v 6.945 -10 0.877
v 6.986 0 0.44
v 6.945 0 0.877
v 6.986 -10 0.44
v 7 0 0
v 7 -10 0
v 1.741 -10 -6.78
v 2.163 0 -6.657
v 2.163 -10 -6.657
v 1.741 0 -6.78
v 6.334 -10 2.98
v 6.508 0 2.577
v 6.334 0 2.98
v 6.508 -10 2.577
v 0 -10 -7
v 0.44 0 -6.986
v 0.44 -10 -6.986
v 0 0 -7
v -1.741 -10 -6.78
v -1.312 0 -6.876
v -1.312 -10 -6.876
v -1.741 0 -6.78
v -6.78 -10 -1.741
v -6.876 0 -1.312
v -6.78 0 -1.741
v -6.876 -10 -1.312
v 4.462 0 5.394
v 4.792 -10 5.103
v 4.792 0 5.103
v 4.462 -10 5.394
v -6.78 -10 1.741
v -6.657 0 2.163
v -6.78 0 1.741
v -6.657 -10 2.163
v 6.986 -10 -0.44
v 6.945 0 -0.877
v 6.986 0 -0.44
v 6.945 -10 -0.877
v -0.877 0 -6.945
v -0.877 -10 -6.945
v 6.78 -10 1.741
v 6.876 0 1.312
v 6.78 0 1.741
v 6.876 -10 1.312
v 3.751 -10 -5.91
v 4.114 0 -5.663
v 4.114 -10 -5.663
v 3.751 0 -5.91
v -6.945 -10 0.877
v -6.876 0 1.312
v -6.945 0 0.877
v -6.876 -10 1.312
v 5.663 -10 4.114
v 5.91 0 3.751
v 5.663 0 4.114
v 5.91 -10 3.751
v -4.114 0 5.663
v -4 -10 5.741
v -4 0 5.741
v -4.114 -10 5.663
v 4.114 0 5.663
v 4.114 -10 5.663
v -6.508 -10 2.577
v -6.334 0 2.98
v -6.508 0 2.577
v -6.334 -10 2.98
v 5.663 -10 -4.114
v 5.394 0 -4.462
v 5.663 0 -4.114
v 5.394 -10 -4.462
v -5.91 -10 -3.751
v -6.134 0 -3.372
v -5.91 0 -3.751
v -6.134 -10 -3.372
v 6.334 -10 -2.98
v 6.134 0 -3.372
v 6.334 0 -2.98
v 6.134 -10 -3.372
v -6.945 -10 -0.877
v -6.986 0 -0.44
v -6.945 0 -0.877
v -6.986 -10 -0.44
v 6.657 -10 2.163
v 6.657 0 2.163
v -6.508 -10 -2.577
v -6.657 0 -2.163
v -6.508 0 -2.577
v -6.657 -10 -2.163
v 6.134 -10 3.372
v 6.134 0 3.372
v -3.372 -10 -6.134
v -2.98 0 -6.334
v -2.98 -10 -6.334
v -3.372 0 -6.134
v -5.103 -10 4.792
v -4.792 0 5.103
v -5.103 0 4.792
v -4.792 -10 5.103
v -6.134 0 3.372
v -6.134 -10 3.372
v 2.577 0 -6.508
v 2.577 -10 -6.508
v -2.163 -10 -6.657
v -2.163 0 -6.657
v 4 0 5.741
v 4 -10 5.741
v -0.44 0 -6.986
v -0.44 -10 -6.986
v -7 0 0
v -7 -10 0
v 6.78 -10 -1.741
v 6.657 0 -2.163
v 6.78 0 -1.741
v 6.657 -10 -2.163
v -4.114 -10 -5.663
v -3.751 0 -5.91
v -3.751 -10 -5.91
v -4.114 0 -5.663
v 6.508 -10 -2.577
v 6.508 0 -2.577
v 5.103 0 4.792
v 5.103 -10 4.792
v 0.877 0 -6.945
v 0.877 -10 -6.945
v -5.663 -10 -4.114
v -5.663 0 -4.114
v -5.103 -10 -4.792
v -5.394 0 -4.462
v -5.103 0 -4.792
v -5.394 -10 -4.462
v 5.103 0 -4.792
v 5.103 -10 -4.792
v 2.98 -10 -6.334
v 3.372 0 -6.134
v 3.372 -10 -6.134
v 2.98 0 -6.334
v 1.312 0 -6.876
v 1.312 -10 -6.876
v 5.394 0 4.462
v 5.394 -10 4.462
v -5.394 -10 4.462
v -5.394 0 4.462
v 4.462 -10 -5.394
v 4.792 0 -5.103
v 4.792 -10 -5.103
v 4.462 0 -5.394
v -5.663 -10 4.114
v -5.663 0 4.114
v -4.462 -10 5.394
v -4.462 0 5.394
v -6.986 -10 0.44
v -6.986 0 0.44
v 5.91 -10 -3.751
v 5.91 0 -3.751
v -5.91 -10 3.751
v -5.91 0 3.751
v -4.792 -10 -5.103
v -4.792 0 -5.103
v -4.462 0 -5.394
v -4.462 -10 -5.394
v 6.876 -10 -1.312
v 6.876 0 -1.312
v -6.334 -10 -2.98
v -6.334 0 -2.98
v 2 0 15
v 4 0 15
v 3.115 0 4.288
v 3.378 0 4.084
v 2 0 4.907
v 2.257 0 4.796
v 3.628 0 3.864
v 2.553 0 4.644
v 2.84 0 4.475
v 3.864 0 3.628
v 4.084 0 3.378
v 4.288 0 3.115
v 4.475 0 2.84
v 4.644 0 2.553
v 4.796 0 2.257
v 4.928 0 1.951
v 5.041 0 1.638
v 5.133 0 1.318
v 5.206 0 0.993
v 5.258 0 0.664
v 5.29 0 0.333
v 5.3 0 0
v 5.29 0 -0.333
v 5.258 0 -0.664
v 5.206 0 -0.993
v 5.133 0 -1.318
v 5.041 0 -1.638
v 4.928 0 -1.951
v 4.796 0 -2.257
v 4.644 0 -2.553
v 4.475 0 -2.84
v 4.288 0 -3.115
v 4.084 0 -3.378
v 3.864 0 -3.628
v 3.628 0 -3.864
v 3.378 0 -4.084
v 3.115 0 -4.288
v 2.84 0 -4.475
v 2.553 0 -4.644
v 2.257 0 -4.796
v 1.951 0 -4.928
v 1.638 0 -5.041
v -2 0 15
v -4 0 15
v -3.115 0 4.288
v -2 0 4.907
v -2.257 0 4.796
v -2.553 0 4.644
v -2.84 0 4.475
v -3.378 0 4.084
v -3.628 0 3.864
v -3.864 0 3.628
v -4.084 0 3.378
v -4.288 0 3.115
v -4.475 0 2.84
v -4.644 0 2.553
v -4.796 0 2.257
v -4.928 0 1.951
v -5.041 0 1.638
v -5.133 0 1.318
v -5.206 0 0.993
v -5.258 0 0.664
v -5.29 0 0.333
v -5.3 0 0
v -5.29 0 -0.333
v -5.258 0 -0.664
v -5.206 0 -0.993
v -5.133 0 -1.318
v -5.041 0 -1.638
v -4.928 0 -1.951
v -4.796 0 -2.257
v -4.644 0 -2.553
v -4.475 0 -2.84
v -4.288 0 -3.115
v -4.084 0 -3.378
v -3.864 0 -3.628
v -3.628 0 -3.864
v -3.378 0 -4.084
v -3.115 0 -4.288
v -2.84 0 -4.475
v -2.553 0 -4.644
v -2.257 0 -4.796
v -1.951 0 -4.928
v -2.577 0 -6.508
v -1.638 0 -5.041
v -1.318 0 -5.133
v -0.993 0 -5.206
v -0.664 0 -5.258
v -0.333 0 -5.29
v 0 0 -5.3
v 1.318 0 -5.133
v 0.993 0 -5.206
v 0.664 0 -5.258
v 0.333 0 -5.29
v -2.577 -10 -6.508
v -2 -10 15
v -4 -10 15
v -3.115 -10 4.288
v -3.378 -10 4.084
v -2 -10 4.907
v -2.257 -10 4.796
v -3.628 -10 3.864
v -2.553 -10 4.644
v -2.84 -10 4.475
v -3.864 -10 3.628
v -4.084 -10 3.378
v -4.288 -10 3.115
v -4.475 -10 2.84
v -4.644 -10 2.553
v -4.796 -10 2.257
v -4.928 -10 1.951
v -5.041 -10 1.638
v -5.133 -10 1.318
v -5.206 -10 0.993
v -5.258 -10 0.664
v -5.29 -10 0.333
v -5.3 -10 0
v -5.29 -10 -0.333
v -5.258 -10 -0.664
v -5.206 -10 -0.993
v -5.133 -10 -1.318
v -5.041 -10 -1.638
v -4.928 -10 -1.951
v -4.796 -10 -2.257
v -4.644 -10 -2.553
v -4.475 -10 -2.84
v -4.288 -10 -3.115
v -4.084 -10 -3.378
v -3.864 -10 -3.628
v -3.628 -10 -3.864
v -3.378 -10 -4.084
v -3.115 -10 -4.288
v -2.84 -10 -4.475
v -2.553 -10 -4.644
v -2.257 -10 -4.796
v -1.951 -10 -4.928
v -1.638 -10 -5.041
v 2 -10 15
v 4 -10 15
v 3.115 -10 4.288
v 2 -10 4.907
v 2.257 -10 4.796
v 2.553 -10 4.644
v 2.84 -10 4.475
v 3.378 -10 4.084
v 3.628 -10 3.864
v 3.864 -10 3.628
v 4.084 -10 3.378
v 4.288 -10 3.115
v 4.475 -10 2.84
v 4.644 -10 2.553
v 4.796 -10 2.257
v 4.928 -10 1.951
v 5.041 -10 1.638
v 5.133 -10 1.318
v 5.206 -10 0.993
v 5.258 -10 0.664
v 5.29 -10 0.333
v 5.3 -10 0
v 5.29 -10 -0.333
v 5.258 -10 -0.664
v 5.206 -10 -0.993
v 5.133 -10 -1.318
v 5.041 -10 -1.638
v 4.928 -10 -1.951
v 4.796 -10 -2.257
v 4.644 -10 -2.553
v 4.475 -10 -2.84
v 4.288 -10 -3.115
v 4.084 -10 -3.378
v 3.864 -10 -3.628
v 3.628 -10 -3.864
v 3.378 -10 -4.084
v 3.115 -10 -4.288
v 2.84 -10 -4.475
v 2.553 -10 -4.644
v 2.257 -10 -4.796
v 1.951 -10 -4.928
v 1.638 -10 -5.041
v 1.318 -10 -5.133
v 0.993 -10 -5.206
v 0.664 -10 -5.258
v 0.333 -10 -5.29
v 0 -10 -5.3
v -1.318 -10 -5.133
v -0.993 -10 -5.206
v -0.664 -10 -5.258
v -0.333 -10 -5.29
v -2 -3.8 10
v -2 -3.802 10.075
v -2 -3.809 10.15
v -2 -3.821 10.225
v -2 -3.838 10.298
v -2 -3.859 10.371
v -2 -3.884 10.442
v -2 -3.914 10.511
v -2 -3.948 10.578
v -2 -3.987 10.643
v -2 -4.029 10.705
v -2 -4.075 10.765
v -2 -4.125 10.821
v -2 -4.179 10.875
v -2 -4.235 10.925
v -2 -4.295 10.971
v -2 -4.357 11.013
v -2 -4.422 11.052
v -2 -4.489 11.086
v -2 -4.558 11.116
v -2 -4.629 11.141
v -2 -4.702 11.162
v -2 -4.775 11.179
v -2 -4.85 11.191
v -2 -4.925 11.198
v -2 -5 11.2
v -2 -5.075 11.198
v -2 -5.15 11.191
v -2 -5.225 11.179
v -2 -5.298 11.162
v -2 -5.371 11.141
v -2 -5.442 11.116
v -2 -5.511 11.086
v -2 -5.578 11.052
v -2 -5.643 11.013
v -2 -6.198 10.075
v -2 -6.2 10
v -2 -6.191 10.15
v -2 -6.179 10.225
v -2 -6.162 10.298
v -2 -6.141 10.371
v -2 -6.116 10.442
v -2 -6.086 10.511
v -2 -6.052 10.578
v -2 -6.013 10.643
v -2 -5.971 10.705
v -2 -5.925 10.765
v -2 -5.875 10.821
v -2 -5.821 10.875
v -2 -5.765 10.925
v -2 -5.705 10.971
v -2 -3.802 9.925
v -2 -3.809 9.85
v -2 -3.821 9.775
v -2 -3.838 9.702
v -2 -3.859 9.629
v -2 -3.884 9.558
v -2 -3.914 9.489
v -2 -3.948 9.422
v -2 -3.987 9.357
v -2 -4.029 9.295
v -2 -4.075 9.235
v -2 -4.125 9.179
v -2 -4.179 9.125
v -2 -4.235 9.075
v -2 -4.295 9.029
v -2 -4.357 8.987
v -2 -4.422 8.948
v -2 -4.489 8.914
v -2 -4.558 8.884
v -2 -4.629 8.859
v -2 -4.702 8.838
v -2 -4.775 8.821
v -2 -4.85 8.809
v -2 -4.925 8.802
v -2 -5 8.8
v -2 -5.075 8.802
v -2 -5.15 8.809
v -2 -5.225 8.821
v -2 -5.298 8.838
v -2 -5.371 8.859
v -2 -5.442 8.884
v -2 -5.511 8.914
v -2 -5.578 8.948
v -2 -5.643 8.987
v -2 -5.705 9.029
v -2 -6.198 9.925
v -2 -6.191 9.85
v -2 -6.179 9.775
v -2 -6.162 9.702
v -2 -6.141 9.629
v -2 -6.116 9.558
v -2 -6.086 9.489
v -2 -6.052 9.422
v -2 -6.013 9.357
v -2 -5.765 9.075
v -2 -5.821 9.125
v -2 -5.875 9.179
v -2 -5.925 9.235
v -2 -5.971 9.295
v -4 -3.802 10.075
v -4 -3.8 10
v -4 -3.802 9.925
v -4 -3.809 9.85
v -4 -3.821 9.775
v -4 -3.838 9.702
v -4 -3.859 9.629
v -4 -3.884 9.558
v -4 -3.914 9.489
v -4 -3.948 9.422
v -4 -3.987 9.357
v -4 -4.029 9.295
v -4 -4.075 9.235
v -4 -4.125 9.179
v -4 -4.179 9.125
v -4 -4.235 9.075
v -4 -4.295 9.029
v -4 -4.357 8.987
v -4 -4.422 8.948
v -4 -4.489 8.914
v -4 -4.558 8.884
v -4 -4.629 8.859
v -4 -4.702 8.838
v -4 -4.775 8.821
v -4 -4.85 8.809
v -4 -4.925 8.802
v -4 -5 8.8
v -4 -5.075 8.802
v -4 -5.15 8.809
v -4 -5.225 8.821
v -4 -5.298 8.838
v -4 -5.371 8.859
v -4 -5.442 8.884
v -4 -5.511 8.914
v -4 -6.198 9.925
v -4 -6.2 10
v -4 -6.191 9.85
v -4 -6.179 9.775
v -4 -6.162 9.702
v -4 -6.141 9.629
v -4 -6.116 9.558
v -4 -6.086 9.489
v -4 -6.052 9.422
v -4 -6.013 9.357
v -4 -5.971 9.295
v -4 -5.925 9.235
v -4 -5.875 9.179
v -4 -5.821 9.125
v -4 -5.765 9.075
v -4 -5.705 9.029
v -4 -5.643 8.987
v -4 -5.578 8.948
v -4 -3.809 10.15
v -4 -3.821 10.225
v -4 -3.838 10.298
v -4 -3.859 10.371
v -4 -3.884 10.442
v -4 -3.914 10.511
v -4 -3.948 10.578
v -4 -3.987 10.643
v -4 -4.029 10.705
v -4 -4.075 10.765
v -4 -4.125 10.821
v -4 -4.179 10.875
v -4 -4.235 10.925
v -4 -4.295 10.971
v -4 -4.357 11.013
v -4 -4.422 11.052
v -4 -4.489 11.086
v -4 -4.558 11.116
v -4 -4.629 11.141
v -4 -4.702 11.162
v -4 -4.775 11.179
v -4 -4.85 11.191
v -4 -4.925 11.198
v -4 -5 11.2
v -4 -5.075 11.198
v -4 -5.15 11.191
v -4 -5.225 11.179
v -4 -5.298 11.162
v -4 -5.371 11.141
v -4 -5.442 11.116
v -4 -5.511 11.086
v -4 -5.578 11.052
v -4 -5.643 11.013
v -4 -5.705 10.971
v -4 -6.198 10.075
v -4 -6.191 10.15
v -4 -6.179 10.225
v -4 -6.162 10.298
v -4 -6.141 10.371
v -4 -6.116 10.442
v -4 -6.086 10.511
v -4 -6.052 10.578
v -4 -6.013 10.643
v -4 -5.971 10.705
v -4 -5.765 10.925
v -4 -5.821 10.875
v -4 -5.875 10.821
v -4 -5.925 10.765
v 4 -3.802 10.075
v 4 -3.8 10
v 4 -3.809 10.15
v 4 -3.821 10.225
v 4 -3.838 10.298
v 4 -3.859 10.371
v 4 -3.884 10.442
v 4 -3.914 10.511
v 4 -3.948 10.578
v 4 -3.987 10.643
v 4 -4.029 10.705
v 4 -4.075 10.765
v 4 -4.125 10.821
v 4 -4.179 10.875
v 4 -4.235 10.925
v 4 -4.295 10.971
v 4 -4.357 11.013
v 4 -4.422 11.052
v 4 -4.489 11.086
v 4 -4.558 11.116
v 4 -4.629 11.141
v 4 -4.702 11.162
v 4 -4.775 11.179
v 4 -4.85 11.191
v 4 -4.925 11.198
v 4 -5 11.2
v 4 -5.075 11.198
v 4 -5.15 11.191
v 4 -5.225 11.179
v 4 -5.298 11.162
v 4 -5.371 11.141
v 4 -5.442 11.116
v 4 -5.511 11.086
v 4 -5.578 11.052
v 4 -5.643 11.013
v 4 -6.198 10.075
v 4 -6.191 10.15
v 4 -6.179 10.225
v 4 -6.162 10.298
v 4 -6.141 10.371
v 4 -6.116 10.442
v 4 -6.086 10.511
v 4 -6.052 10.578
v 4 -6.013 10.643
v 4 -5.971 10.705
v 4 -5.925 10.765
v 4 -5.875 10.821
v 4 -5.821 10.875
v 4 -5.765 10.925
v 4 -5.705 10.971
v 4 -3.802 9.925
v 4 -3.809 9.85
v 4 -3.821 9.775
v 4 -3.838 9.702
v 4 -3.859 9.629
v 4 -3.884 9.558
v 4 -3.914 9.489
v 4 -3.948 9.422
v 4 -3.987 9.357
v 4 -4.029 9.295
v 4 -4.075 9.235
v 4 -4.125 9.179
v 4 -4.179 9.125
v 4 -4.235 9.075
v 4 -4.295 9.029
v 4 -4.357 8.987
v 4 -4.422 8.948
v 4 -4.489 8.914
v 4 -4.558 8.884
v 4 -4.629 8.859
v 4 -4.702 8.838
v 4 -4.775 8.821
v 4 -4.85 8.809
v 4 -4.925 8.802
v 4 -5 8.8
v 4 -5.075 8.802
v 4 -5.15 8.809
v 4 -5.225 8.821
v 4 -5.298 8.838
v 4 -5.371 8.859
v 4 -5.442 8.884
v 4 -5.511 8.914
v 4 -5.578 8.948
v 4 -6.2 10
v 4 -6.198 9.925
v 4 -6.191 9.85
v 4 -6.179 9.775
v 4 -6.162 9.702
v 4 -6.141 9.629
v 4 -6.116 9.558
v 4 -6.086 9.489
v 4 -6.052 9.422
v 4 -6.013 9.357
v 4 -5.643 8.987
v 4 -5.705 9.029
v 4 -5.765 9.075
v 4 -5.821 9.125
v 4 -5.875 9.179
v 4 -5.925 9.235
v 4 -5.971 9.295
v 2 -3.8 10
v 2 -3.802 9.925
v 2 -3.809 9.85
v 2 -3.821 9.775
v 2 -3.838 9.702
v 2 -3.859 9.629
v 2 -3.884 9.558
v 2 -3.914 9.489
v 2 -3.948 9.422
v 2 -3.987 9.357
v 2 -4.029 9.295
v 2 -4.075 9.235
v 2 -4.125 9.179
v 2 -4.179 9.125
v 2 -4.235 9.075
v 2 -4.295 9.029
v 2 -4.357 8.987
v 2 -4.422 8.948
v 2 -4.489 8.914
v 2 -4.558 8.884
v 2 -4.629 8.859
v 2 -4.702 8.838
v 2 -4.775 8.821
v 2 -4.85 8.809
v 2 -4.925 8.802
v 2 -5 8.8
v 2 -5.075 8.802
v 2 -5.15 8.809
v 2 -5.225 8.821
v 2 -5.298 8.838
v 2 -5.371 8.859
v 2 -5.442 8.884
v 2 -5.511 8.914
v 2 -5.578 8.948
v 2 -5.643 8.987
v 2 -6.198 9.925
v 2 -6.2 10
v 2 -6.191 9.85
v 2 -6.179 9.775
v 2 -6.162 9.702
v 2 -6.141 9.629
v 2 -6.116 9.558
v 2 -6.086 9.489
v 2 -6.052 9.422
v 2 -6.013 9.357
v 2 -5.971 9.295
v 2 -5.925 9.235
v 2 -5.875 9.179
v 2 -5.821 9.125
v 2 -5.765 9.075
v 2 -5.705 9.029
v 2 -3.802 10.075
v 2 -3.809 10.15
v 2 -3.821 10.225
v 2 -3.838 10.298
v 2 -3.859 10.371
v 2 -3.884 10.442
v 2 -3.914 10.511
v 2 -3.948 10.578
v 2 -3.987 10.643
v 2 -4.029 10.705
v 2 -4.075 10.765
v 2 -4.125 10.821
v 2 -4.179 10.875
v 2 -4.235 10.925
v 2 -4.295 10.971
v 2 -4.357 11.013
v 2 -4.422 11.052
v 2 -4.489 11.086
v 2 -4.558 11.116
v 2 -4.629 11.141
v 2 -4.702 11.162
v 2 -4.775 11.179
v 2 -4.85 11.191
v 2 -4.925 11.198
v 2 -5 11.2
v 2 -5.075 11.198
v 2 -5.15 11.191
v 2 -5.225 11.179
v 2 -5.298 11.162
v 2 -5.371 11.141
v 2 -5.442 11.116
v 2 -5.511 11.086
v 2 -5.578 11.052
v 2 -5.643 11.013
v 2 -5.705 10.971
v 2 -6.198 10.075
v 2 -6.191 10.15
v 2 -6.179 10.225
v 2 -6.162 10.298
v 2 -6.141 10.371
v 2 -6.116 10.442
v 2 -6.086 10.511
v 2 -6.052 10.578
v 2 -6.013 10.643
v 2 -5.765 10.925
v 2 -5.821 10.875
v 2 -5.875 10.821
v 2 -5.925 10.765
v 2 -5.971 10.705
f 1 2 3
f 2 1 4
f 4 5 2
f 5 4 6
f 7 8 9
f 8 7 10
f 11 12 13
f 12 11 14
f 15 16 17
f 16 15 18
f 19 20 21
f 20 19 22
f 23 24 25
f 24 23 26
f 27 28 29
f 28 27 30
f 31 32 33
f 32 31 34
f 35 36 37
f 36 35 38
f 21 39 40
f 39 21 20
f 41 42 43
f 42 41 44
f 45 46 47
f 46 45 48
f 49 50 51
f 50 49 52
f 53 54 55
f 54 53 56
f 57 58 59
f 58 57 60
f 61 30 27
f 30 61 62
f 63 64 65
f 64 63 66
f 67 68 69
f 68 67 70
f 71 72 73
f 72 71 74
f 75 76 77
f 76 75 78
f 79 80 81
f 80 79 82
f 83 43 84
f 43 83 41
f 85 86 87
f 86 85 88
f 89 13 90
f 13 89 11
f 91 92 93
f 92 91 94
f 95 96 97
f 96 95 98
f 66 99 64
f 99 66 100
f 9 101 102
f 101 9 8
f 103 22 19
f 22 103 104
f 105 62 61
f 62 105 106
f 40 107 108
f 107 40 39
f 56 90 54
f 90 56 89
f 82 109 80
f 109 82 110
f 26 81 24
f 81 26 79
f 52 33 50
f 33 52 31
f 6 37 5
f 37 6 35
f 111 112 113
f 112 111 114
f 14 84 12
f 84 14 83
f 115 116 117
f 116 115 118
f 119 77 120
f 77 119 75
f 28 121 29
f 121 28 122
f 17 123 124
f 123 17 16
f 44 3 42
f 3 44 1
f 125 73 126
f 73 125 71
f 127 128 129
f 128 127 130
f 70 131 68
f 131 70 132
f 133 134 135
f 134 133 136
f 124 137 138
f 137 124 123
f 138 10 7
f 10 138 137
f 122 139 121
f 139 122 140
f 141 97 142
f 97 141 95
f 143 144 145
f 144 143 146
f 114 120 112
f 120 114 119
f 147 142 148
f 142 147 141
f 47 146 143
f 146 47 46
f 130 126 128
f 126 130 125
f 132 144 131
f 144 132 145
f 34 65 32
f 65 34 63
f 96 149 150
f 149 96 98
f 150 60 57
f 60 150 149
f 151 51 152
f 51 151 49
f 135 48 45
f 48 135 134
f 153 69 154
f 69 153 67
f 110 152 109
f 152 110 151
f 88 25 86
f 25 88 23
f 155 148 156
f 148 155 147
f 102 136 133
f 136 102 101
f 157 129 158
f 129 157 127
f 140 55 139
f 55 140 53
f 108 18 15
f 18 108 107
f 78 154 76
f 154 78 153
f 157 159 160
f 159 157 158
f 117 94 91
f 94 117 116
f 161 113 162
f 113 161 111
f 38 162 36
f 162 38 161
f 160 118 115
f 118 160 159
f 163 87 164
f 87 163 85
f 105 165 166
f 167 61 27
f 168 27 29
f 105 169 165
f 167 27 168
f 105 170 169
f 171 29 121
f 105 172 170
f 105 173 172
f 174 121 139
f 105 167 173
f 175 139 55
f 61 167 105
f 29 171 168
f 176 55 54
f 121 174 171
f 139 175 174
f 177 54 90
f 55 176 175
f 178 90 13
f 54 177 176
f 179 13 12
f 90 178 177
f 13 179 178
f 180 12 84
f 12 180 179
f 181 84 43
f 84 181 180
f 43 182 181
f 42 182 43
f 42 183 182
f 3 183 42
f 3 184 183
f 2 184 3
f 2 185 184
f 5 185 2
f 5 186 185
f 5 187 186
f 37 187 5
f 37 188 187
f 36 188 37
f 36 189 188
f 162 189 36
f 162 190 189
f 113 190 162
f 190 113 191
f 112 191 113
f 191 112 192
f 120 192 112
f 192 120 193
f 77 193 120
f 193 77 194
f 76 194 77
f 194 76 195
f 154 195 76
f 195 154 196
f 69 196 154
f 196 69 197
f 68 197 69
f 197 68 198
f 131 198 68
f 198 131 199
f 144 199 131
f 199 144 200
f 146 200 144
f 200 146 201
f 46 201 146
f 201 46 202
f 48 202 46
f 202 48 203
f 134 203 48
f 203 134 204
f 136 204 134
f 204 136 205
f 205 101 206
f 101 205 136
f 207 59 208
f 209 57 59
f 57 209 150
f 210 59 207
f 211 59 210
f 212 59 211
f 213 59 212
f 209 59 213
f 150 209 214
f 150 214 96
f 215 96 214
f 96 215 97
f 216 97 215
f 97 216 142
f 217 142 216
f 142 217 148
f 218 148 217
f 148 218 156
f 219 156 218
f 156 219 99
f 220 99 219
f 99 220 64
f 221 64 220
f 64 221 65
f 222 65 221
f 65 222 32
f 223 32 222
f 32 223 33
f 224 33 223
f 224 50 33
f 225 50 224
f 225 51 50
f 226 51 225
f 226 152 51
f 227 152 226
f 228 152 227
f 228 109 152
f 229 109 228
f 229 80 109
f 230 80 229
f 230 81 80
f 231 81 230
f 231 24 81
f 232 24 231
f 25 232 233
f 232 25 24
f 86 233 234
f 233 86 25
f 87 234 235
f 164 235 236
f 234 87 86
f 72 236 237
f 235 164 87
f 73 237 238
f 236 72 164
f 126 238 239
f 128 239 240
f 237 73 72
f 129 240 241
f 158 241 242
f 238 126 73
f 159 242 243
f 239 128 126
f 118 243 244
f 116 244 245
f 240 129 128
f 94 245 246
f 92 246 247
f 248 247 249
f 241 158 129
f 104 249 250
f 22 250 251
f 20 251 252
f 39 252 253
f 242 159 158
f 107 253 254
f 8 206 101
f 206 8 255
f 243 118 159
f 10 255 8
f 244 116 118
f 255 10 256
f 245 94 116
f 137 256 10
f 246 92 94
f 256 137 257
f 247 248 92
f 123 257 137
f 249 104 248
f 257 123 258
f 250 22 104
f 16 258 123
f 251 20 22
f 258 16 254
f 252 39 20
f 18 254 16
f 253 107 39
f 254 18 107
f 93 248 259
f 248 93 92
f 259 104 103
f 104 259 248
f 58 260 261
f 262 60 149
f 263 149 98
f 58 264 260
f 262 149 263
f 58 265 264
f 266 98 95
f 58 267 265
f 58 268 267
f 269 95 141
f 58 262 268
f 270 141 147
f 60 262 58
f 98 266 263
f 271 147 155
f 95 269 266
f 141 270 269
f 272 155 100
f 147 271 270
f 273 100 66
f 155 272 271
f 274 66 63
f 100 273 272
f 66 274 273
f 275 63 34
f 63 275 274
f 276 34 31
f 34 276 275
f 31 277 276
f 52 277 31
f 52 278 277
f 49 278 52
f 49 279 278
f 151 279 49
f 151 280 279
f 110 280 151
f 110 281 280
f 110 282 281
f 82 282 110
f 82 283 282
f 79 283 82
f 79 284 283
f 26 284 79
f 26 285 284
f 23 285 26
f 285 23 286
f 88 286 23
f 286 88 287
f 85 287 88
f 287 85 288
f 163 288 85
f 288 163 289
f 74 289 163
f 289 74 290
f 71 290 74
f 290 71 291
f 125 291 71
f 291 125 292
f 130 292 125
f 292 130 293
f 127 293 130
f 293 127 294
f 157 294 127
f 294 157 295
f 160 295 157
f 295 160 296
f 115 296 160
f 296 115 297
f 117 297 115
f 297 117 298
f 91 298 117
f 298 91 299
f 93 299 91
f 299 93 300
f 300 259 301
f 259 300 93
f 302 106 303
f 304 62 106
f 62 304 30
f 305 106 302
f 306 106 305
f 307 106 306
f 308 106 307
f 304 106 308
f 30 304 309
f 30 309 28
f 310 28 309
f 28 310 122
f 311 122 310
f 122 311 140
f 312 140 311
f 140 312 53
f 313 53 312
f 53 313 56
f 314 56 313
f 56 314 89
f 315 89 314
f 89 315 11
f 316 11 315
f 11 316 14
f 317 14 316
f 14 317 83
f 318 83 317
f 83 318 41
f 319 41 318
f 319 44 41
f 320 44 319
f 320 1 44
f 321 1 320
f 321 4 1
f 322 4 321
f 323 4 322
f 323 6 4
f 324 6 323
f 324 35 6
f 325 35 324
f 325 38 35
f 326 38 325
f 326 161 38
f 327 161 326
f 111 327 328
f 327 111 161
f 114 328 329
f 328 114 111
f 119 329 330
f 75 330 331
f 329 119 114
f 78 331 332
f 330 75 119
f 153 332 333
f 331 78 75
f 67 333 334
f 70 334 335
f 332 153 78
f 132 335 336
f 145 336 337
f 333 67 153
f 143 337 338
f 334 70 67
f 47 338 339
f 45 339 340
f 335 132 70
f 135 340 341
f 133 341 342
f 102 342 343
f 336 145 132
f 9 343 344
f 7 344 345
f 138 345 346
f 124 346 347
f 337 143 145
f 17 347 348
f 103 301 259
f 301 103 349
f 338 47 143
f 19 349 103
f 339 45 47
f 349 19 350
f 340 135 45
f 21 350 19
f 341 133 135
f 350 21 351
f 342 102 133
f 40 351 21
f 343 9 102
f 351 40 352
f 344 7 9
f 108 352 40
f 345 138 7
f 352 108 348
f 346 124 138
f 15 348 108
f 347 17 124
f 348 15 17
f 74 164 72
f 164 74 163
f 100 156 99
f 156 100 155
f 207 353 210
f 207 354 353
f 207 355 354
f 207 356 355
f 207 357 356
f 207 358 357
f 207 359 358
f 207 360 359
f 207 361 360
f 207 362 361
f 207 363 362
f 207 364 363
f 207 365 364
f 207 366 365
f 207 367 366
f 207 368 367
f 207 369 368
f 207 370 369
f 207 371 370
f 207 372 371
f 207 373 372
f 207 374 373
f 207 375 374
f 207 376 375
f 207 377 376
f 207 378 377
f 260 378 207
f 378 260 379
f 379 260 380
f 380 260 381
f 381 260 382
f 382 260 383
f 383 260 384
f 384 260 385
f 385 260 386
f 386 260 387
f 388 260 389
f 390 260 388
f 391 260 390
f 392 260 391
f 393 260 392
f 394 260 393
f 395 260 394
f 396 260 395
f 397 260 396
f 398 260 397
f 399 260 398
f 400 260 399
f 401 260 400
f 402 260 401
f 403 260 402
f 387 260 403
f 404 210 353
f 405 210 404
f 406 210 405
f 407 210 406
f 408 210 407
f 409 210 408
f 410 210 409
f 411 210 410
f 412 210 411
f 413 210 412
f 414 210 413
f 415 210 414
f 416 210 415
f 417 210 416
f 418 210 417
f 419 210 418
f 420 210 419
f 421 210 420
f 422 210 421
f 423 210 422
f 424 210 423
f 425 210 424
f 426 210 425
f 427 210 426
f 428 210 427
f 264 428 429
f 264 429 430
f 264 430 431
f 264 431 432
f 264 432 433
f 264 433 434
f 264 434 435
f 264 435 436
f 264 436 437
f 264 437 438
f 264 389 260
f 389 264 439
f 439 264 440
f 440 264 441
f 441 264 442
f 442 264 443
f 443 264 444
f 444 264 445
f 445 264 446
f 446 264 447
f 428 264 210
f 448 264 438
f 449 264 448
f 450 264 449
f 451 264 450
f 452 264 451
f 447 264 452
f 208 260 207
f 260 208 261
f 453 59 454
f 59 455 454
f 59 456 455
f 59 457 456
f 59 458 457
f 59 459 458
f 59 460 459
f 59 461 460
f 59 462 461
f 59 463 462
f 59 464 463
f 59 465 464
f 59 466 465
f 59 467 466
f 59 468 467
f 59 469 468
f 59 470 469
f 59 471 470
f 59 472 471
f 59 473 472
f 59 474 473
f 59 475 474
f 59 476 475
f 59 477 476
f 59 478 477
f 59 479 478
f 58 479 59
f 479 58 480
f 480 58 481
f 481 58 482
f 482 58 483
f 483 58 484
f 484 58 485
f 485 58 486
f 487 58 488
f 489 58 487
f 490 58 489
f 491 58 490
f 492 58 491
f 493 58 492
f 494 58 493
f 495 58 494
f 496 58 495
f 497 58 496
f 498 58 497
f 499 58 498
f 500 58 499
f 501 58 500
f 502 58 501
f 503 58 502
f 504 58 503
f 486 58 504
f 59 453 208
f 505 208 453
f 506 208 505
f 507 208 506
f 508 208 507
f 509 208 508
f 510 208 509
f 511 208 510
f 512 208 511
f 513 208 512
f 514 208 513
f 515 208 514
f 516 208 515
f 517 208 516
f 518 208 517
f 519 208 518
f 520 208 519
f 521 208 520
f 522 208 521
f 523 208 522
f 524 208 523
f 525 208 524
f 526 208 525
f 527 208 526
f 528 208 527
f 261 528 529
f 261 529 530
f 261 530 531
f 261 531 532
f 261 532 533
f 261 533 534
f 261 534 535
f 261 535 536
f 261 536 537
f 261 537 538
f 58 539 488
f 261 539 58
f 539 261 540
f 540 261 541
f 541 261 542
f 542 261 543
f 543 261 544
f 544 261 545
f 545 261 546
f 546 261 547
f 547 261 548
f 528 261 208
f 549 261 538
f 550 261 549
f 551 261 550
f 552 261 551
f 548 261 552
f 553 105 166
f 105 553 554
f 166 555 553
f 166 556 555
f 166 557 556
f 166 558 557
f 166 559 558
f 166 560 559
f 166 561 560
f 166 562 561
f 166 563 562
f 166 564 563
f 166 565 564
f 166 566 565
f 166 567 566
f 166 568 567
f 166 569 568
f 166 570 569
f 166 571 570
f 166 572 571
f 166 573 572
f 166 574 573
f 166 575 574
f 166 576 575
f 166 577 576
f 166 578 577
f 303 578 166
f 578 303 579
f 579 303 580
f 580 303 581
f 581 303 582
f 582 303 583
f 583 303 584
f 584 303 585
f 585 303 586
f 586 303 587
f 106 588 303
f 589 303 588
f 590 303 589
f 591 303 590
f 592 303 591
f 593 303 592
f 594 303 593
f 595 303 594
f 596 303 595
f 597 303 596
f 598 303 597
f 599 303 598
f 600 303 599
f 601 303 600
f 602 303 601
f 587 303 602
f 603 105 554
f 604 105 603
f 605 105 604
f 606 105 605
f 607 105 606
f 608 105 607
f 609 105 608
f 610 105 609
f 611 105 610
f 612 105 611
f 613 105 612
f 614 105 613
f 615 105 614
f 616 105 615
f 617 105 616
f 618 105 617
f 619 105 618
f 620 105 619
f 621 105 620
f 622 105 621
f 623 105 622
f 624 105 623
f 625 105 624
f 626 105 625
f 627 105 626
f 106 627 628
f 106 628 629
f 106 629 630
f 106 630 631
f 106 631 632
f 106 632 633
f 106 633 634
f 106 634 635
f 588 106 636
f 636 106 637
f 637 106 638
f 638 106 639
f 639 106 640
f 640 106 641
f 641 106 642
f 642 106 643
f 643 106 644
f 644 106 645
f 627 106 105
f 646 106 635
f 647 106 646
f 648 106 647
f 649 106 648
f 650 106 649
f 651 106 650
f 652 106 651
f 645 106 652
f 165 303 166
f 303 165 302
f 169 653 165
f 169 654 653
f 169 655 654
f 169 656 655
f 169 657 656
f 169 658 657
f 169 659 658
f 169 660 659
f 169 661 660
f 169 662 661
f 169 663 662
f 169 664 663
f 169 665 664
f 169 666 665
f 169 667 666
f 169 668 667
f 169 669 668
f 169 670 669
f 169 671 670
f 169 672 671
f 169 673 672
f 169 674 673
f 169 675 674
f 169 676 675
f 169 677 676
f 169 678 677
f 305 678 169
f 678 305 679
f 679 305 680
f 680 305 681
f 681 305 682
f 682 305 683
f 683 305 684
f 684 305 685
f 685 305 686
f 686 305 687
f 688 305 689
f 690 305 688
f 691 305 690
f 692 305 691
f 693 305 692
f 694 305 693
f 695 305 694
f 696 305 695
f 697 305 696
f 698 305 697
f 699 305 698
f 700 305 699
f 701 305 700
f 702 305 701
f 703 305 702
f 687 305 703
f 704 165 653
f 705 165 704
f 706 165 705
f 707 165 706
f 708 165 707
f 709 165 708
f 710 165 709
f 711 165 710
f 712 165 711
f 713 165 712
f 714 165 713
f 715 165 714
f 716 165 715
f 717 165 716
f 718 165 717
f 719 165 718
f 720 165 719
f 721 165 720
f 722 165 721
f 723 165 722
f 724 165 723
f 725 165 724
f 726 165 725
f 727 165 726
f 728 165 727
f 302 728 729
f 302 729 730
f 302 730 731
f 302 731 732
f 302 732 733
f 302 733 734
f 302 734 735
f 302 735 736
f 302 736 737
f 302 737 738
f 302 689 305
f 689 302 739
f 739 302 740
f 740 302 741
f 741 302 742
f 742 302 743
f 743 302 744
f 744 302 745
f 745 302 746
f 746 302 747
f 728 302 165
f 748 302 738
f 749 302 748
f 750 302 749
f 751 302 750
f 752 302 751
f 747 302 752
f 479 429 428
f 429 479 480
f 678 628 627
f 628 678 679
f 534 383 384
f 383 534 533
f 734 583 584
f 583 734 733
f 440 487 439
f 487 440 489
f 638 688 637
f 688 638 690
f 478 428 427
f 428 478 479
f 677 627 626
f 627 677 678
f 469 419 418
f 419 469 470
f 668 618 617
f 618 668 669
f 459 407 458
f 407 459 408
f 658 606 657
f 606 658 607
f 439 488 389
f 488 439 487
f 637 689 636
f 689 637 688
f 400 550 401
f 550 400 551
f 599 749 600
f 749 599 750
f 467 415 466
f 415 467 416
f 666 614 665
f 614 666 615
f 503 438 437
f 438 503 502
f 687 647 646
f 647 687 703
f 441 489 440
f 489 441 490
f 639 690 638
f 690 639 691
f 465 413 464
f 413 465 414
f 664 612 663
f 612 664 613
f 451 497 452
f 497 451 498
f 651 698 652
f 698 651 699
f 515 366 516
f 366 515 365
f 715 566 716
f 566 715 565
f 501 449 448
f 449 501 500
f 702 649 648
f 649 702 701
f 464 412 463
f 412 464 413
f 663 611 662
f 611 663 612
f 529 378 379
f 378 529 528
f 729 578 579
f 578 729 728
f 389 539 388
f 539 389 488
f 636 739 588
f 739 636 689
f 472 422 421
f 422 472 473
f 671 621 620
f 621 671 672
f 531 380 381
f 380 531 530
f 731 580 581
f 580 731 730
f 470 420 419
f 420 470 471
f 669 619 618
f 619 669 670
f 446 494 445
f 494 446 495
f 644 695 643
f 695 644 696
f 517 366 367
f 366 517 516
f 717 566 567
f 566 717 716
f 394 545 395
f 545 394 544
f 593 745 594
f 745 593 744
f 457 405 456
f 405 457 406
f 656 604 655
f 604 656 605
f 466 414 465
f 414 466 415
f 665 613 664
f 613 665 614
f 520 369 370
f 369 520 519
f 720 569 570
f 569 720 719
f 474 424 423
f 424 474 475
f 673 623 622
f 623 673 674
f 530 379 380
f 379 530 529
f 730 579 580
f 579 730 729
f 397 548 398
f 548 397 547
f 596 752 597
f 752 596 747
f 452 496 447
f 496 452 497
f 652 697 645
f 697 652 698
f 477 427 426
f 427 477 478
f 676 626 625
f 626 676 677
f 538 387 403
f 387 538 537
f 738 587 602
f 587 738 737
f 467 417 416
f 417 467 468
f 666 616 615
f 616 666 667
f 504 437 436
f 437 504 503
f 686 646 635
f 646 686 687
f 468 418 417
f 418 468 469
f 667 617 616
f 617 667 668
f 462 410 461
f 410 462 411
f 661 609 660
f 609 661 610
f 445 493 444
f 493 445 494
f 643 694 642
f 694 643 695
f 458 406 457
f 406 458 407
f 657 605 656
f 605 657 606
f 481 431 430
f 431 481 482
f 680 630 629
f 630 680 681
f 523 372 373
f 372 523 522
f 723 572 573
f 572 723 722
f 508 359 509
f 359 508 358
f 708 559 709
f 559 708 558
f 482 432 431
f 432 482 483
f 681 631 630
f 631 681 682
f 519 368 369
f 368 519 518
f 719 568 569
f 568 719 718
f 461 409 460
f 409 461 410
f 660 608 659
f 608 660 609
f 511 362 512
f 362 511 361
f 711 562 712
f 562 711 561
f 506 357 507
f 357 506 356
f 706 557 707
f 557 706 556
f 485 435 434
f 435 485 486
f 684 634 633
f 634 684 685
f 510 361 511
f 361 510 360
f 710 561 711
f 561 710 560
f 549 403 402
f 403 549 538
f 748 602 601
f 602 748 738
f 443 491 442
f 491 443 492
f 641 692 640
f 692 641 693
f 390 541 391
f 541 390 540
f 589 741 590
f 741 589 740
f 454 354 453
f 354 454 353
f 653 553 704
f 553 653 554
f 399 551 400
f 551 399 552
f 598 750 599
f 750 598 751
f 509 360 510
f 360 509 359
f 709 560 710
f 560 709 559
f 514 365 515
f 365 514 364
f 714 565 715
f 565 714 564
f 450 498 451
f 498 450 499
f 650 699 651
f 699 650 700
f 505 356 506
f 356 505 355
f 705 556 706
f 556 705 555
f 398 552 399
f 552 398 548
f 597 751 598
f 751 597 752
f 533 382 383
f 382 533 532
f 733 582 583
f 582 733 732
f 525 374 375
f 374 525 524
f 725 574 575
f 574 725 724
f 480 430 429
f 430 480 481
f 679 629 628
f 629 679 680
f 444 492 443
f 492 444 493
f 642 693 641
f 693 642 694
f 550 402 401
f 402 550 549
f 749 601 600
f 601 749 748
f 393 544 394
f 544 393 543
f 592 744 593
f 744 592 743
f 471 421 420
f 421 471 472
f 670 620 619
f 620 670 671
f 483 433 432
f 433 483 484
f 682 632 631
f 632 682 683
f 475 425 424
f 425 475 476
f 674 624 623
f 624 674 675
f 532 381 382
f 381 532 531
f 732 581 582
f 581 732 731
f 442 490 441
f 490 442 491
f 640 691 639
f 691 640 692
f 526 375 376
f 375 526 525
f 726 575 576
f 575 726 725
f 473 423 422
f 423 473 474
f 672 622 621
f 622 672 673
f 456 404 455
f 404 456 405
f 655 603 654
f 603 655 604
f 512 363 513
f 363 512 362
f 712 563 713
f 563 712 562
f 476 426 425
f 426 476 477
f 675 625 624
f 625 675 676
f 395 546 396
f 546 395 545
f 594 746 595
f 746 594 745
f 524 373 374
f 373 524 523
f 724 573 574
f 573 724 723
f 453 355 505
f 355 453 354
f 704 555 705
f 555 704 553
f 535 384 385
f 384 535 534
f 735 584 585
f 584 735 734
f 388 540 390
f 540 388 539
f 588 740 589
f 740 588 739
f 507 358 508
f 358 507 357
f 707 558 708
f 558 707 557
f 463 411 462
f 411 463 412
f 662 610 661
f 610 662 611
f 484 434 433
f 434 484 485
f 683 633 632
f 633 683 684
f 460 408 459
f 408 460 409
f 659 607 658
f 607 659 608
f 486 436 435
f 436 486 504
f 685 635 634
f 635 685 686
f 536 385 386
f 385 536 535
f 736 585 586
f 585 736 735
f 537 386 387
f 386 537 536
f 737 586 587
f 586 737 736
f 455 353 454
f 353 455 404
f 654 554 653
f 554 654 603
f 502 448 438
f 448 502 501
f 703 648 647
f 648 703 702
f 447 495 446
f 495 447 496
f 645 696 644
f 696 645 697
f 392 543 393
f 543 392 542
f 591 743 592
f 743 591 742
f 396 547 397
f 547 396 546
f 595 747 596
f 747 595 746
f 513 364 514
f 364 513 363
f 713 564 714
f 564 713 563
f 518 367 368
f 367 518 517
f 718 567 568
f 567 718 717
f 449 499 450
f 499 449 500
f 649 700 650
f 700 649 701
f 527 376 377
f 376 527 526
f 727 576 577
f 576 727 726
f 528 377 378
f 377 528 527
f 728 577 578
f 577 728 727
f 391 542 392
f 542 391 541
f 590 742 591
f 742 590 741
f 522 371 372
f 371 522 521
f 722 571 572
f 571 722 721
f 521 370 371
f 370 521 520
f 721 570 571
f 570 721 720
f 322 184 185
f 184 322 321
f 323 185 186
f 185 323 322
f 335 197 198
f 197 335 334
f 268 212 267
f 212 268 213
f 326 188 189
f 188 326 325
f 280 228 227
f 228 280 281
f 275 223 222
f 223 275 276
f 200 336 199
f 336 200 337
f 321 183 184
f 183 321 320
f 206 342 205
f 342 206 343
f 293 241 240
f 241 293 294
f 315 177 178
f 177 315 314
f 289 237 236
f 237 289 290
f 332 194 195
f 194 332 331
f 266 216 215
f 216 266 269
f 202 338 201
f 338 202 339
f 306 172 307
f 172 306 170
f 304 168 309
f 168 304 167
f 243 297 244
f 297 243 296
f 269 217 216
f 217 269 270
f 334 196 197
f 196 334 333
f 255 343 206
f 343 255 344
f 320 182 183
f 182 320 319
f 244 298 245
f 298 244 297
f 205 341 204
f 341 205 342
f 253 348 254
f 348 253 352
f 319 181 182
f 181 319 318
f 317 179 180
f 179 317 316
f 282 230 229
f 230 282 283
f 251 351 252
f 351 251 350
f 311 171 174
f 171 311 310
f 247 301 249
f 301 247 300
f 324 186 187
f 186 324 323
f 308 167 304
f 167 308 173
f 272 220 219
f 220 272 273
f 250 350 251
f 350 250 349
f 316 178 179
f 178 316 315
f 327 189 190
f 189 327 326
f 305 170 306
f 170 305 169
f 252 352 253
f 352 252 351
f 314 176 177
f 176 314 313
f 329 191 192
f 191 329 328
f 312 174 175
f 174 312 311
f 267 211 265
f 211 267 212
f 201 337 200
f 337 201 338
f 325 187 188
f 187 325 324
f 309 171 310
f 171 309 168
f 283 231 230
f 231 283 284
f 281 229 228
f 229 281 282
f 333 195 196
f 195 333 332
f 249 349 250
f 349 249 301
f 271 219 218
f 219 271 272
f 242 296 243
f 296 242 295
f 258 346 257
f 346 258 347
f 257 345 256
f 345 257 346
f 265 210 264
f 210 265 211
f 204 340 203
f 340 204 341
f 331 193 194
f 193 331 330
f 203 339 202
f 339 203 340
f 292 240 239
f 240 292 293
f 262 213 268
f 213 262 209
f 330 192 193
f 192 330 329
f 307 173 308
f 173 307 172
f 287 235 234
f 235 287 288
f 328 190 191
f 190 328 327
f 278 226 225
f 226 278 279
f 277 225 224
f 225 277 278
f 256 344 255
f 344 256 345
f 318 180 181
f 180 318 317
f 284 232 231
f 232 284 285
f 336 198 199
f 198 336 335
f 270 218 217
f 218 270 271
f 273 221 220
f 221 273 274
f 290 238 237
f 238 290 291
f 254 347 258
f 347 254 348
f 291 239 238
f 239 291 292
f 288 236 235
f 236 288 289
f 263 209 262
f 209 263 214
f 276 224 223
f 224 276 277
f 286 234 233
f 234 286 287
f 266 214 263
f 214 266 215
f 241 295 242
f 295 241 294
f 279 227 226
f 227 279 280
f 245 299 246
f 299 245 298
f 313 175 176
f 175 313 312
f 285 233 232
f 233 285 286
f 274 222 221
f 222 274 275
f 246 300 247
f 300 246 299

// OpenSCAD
difference(){
	union(){
        

        translate([0,0,0]){
            rotate([90,0,0]){
                cylinder(h=10, r=7, $fn=100, center=false);
            }
        }       

        translate([-4,-10,0]){
            cube([2,10,15], center=false);
        }         
        translate([2,-10,0]){
            cube([2,10,15], center=false);
        }         


	}
	union() {
        translate([-10,-5,10]){
            rotate([0,90,0]){
                cylinder(h=25, r=1.2, $fn=100, center=false);
            }
        }       


        translate([-2,-12,0]){
            cube([4,30,30], center=false);
        }         

        translate([0,1,0]){
            rotate([90,0,0]){
                cylinder(h=25, r=5.3, $fn=100, center=false);
            }
        }       

	}
}
